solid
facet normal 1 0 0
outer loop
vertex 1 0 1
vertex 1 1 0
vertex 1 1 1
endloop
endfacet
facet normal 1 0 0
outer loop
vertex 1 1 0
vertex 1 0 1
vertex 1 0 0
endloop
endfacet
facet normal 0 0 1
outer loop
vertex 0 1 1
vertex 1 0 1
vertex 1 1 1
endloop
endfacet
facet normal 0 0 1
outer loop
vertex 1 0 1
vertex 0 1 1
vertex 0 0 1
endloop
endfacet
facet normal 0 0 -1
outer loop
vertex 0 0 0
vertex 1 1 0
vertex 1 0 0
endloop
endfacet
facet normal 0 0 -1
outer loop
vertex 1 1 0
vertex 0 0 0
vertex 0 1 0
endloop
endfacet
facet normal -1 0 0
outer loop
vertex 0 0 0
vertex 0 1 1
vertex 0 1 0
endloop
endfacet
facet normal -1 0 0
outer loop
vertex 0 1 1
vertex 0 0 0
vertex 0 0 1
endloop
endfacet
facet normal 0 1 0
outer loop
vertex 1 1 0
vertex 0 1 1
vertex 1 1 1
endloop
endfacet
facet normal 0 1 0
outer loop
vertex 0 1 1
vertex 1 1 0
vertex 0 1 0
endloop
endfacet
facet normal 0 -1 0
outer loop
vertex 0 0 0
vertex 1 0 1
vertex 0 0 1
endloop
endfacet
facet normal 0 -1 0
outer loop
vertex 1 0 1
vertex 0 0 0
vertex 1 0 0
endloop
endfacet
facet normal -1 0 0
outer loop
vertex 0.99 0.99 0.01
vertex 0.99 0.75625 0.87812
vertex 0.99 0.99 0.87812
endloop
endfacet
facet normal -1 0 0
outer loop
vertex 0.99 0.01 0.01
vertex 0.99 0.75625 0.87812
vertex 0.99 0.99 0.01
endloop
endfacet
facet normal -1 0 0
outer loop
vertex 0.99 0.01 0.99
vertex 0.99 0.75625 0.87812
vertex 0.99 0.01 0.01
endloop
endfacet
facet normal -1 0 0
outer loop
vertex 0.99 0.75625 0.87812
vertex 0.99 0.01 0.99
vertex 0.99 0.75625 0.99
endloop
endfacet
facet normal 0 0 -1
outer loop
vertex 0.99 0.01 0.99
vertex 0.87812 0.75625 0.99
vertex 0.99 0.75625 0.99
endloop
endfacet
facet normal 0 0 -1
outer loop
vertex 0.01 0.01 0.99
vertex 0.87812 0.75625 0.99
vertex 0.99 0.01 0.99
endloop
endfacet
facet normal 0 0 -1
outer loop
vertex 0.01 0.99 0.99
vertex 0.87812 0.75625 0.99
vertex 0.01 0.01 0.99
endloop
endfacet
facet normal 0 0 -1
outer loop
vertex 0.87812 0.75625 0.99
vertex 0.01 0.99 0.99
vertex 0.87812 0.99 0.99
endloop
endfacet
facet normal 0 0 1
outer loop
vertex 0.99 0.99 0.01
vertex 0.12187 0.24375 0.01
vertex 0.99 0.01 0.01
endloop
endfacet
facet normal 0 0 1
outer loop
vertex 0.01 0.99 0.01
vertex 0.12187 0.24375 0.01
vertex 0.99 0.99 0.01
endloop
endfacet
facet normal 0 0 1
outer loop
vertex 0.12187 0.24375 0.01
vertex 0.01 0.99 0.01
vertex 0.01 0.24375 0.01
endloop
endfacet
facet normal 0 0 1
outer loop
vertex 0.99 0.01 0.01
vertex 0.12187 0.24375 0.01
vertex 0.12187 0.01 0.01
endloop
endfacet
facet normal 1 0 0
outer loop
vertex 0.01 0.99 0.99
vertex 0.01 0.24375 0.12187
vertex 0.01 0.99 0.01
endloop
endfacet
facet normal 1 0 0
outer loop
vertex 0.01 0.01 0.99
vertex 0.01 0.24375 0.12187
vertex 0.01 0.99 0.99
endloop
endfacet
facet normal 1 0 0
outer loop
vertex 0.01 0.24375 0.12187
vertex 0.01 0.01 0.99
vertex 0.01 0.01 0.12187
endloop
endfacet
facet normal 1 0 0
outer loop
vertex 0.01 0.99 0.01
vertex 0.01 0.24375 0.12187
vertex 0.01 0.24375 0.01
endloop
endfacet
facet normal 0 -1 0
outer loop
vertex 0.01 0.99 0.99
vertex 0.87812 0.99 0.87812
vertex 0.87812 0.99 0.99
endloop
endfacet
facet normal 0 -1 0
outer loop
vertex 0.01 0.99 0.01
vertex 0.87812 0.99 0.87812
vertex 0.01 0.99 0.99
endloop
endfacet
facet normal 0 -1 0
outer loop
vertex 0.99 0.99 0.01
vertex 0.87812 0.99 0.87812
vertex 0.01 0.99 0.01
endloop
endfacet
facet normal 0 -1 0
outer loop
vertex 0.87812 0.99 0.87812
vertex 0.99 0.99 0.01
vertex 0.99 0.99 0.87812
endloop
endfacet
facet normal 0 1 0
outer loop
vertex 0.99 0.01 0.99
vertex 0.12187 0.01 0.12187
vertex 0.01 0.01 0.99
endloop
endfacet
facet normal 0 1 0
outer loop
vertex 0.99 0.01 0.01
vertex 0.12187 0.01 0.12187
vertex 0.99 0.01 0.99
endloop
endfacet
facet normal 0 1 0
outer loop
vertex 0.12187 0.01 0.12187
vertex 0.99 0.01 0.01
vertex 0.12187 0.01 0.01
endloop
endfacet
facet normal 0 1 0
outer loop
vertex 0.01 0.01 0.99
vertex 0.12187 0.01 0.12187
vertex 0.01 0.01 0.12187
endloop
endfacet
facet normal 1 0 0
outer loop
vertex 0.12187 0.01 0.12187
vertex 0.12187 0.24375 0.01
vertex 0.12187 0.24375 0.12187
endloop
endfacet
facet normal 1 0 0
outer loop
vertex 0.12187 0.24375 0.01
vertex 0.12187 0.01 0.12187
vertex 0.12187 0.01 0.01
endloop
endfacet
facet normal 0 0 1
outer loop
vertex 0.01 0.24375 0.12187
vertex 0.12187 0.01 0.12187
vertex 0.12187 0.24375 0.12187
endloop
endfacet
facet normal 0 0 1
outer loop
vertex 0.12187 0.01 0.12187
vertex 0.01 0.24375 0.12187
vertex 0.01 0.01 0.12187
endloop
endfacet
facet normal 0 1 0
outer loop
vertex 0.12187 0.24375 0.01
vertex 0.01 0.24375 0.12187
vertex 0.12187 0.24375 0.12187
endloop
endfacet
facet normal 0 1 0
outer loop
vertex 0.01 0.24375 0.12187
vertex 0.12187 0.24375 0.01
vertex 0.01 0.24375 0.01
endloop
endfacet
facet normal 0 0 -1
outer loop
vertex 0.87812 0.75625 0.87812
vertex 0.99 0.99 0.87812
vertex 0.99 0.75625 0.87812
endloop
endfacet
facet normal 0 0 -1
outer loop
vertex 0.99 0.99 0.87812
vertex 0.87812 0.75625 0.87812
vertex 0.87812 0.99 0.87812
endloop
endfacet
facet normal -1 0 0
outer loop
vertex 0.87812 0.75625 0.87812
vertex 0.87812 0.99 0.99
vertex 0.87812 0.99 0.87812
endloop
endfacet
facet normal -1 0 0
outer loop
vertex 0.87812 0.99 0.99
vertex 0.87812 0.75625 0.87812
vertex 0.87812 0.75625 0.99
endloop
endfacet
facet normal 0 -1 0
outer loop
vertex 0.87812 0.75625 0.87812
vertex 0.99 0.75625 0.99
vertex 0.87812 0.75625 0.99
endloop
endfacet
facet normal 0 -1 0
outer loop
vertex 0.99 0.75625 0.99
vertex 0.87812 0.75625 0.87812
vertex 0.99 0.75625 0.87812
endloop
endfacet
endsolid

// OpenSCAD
translate([0.0625, 0.125, 0.0625]) color([0.6617918474406483, 0.8800476441724, 0.35790415810623144]) cube([0.11875, 0.2375, 0.11875], center=true);
translate([0.9375, 0.875, 0.9375]) color([0.9363814172793983, 0.2462517128887105, 0.011644640876006584]) cube([0.11875, 0.2375, 0.11875], center=true);
color([0.3,0.3,0.3,0.3]) difference() { cube([1,1,1]); translate([0.01,0.01,0.01]) cube([0.98,0.98,0.98]); }
